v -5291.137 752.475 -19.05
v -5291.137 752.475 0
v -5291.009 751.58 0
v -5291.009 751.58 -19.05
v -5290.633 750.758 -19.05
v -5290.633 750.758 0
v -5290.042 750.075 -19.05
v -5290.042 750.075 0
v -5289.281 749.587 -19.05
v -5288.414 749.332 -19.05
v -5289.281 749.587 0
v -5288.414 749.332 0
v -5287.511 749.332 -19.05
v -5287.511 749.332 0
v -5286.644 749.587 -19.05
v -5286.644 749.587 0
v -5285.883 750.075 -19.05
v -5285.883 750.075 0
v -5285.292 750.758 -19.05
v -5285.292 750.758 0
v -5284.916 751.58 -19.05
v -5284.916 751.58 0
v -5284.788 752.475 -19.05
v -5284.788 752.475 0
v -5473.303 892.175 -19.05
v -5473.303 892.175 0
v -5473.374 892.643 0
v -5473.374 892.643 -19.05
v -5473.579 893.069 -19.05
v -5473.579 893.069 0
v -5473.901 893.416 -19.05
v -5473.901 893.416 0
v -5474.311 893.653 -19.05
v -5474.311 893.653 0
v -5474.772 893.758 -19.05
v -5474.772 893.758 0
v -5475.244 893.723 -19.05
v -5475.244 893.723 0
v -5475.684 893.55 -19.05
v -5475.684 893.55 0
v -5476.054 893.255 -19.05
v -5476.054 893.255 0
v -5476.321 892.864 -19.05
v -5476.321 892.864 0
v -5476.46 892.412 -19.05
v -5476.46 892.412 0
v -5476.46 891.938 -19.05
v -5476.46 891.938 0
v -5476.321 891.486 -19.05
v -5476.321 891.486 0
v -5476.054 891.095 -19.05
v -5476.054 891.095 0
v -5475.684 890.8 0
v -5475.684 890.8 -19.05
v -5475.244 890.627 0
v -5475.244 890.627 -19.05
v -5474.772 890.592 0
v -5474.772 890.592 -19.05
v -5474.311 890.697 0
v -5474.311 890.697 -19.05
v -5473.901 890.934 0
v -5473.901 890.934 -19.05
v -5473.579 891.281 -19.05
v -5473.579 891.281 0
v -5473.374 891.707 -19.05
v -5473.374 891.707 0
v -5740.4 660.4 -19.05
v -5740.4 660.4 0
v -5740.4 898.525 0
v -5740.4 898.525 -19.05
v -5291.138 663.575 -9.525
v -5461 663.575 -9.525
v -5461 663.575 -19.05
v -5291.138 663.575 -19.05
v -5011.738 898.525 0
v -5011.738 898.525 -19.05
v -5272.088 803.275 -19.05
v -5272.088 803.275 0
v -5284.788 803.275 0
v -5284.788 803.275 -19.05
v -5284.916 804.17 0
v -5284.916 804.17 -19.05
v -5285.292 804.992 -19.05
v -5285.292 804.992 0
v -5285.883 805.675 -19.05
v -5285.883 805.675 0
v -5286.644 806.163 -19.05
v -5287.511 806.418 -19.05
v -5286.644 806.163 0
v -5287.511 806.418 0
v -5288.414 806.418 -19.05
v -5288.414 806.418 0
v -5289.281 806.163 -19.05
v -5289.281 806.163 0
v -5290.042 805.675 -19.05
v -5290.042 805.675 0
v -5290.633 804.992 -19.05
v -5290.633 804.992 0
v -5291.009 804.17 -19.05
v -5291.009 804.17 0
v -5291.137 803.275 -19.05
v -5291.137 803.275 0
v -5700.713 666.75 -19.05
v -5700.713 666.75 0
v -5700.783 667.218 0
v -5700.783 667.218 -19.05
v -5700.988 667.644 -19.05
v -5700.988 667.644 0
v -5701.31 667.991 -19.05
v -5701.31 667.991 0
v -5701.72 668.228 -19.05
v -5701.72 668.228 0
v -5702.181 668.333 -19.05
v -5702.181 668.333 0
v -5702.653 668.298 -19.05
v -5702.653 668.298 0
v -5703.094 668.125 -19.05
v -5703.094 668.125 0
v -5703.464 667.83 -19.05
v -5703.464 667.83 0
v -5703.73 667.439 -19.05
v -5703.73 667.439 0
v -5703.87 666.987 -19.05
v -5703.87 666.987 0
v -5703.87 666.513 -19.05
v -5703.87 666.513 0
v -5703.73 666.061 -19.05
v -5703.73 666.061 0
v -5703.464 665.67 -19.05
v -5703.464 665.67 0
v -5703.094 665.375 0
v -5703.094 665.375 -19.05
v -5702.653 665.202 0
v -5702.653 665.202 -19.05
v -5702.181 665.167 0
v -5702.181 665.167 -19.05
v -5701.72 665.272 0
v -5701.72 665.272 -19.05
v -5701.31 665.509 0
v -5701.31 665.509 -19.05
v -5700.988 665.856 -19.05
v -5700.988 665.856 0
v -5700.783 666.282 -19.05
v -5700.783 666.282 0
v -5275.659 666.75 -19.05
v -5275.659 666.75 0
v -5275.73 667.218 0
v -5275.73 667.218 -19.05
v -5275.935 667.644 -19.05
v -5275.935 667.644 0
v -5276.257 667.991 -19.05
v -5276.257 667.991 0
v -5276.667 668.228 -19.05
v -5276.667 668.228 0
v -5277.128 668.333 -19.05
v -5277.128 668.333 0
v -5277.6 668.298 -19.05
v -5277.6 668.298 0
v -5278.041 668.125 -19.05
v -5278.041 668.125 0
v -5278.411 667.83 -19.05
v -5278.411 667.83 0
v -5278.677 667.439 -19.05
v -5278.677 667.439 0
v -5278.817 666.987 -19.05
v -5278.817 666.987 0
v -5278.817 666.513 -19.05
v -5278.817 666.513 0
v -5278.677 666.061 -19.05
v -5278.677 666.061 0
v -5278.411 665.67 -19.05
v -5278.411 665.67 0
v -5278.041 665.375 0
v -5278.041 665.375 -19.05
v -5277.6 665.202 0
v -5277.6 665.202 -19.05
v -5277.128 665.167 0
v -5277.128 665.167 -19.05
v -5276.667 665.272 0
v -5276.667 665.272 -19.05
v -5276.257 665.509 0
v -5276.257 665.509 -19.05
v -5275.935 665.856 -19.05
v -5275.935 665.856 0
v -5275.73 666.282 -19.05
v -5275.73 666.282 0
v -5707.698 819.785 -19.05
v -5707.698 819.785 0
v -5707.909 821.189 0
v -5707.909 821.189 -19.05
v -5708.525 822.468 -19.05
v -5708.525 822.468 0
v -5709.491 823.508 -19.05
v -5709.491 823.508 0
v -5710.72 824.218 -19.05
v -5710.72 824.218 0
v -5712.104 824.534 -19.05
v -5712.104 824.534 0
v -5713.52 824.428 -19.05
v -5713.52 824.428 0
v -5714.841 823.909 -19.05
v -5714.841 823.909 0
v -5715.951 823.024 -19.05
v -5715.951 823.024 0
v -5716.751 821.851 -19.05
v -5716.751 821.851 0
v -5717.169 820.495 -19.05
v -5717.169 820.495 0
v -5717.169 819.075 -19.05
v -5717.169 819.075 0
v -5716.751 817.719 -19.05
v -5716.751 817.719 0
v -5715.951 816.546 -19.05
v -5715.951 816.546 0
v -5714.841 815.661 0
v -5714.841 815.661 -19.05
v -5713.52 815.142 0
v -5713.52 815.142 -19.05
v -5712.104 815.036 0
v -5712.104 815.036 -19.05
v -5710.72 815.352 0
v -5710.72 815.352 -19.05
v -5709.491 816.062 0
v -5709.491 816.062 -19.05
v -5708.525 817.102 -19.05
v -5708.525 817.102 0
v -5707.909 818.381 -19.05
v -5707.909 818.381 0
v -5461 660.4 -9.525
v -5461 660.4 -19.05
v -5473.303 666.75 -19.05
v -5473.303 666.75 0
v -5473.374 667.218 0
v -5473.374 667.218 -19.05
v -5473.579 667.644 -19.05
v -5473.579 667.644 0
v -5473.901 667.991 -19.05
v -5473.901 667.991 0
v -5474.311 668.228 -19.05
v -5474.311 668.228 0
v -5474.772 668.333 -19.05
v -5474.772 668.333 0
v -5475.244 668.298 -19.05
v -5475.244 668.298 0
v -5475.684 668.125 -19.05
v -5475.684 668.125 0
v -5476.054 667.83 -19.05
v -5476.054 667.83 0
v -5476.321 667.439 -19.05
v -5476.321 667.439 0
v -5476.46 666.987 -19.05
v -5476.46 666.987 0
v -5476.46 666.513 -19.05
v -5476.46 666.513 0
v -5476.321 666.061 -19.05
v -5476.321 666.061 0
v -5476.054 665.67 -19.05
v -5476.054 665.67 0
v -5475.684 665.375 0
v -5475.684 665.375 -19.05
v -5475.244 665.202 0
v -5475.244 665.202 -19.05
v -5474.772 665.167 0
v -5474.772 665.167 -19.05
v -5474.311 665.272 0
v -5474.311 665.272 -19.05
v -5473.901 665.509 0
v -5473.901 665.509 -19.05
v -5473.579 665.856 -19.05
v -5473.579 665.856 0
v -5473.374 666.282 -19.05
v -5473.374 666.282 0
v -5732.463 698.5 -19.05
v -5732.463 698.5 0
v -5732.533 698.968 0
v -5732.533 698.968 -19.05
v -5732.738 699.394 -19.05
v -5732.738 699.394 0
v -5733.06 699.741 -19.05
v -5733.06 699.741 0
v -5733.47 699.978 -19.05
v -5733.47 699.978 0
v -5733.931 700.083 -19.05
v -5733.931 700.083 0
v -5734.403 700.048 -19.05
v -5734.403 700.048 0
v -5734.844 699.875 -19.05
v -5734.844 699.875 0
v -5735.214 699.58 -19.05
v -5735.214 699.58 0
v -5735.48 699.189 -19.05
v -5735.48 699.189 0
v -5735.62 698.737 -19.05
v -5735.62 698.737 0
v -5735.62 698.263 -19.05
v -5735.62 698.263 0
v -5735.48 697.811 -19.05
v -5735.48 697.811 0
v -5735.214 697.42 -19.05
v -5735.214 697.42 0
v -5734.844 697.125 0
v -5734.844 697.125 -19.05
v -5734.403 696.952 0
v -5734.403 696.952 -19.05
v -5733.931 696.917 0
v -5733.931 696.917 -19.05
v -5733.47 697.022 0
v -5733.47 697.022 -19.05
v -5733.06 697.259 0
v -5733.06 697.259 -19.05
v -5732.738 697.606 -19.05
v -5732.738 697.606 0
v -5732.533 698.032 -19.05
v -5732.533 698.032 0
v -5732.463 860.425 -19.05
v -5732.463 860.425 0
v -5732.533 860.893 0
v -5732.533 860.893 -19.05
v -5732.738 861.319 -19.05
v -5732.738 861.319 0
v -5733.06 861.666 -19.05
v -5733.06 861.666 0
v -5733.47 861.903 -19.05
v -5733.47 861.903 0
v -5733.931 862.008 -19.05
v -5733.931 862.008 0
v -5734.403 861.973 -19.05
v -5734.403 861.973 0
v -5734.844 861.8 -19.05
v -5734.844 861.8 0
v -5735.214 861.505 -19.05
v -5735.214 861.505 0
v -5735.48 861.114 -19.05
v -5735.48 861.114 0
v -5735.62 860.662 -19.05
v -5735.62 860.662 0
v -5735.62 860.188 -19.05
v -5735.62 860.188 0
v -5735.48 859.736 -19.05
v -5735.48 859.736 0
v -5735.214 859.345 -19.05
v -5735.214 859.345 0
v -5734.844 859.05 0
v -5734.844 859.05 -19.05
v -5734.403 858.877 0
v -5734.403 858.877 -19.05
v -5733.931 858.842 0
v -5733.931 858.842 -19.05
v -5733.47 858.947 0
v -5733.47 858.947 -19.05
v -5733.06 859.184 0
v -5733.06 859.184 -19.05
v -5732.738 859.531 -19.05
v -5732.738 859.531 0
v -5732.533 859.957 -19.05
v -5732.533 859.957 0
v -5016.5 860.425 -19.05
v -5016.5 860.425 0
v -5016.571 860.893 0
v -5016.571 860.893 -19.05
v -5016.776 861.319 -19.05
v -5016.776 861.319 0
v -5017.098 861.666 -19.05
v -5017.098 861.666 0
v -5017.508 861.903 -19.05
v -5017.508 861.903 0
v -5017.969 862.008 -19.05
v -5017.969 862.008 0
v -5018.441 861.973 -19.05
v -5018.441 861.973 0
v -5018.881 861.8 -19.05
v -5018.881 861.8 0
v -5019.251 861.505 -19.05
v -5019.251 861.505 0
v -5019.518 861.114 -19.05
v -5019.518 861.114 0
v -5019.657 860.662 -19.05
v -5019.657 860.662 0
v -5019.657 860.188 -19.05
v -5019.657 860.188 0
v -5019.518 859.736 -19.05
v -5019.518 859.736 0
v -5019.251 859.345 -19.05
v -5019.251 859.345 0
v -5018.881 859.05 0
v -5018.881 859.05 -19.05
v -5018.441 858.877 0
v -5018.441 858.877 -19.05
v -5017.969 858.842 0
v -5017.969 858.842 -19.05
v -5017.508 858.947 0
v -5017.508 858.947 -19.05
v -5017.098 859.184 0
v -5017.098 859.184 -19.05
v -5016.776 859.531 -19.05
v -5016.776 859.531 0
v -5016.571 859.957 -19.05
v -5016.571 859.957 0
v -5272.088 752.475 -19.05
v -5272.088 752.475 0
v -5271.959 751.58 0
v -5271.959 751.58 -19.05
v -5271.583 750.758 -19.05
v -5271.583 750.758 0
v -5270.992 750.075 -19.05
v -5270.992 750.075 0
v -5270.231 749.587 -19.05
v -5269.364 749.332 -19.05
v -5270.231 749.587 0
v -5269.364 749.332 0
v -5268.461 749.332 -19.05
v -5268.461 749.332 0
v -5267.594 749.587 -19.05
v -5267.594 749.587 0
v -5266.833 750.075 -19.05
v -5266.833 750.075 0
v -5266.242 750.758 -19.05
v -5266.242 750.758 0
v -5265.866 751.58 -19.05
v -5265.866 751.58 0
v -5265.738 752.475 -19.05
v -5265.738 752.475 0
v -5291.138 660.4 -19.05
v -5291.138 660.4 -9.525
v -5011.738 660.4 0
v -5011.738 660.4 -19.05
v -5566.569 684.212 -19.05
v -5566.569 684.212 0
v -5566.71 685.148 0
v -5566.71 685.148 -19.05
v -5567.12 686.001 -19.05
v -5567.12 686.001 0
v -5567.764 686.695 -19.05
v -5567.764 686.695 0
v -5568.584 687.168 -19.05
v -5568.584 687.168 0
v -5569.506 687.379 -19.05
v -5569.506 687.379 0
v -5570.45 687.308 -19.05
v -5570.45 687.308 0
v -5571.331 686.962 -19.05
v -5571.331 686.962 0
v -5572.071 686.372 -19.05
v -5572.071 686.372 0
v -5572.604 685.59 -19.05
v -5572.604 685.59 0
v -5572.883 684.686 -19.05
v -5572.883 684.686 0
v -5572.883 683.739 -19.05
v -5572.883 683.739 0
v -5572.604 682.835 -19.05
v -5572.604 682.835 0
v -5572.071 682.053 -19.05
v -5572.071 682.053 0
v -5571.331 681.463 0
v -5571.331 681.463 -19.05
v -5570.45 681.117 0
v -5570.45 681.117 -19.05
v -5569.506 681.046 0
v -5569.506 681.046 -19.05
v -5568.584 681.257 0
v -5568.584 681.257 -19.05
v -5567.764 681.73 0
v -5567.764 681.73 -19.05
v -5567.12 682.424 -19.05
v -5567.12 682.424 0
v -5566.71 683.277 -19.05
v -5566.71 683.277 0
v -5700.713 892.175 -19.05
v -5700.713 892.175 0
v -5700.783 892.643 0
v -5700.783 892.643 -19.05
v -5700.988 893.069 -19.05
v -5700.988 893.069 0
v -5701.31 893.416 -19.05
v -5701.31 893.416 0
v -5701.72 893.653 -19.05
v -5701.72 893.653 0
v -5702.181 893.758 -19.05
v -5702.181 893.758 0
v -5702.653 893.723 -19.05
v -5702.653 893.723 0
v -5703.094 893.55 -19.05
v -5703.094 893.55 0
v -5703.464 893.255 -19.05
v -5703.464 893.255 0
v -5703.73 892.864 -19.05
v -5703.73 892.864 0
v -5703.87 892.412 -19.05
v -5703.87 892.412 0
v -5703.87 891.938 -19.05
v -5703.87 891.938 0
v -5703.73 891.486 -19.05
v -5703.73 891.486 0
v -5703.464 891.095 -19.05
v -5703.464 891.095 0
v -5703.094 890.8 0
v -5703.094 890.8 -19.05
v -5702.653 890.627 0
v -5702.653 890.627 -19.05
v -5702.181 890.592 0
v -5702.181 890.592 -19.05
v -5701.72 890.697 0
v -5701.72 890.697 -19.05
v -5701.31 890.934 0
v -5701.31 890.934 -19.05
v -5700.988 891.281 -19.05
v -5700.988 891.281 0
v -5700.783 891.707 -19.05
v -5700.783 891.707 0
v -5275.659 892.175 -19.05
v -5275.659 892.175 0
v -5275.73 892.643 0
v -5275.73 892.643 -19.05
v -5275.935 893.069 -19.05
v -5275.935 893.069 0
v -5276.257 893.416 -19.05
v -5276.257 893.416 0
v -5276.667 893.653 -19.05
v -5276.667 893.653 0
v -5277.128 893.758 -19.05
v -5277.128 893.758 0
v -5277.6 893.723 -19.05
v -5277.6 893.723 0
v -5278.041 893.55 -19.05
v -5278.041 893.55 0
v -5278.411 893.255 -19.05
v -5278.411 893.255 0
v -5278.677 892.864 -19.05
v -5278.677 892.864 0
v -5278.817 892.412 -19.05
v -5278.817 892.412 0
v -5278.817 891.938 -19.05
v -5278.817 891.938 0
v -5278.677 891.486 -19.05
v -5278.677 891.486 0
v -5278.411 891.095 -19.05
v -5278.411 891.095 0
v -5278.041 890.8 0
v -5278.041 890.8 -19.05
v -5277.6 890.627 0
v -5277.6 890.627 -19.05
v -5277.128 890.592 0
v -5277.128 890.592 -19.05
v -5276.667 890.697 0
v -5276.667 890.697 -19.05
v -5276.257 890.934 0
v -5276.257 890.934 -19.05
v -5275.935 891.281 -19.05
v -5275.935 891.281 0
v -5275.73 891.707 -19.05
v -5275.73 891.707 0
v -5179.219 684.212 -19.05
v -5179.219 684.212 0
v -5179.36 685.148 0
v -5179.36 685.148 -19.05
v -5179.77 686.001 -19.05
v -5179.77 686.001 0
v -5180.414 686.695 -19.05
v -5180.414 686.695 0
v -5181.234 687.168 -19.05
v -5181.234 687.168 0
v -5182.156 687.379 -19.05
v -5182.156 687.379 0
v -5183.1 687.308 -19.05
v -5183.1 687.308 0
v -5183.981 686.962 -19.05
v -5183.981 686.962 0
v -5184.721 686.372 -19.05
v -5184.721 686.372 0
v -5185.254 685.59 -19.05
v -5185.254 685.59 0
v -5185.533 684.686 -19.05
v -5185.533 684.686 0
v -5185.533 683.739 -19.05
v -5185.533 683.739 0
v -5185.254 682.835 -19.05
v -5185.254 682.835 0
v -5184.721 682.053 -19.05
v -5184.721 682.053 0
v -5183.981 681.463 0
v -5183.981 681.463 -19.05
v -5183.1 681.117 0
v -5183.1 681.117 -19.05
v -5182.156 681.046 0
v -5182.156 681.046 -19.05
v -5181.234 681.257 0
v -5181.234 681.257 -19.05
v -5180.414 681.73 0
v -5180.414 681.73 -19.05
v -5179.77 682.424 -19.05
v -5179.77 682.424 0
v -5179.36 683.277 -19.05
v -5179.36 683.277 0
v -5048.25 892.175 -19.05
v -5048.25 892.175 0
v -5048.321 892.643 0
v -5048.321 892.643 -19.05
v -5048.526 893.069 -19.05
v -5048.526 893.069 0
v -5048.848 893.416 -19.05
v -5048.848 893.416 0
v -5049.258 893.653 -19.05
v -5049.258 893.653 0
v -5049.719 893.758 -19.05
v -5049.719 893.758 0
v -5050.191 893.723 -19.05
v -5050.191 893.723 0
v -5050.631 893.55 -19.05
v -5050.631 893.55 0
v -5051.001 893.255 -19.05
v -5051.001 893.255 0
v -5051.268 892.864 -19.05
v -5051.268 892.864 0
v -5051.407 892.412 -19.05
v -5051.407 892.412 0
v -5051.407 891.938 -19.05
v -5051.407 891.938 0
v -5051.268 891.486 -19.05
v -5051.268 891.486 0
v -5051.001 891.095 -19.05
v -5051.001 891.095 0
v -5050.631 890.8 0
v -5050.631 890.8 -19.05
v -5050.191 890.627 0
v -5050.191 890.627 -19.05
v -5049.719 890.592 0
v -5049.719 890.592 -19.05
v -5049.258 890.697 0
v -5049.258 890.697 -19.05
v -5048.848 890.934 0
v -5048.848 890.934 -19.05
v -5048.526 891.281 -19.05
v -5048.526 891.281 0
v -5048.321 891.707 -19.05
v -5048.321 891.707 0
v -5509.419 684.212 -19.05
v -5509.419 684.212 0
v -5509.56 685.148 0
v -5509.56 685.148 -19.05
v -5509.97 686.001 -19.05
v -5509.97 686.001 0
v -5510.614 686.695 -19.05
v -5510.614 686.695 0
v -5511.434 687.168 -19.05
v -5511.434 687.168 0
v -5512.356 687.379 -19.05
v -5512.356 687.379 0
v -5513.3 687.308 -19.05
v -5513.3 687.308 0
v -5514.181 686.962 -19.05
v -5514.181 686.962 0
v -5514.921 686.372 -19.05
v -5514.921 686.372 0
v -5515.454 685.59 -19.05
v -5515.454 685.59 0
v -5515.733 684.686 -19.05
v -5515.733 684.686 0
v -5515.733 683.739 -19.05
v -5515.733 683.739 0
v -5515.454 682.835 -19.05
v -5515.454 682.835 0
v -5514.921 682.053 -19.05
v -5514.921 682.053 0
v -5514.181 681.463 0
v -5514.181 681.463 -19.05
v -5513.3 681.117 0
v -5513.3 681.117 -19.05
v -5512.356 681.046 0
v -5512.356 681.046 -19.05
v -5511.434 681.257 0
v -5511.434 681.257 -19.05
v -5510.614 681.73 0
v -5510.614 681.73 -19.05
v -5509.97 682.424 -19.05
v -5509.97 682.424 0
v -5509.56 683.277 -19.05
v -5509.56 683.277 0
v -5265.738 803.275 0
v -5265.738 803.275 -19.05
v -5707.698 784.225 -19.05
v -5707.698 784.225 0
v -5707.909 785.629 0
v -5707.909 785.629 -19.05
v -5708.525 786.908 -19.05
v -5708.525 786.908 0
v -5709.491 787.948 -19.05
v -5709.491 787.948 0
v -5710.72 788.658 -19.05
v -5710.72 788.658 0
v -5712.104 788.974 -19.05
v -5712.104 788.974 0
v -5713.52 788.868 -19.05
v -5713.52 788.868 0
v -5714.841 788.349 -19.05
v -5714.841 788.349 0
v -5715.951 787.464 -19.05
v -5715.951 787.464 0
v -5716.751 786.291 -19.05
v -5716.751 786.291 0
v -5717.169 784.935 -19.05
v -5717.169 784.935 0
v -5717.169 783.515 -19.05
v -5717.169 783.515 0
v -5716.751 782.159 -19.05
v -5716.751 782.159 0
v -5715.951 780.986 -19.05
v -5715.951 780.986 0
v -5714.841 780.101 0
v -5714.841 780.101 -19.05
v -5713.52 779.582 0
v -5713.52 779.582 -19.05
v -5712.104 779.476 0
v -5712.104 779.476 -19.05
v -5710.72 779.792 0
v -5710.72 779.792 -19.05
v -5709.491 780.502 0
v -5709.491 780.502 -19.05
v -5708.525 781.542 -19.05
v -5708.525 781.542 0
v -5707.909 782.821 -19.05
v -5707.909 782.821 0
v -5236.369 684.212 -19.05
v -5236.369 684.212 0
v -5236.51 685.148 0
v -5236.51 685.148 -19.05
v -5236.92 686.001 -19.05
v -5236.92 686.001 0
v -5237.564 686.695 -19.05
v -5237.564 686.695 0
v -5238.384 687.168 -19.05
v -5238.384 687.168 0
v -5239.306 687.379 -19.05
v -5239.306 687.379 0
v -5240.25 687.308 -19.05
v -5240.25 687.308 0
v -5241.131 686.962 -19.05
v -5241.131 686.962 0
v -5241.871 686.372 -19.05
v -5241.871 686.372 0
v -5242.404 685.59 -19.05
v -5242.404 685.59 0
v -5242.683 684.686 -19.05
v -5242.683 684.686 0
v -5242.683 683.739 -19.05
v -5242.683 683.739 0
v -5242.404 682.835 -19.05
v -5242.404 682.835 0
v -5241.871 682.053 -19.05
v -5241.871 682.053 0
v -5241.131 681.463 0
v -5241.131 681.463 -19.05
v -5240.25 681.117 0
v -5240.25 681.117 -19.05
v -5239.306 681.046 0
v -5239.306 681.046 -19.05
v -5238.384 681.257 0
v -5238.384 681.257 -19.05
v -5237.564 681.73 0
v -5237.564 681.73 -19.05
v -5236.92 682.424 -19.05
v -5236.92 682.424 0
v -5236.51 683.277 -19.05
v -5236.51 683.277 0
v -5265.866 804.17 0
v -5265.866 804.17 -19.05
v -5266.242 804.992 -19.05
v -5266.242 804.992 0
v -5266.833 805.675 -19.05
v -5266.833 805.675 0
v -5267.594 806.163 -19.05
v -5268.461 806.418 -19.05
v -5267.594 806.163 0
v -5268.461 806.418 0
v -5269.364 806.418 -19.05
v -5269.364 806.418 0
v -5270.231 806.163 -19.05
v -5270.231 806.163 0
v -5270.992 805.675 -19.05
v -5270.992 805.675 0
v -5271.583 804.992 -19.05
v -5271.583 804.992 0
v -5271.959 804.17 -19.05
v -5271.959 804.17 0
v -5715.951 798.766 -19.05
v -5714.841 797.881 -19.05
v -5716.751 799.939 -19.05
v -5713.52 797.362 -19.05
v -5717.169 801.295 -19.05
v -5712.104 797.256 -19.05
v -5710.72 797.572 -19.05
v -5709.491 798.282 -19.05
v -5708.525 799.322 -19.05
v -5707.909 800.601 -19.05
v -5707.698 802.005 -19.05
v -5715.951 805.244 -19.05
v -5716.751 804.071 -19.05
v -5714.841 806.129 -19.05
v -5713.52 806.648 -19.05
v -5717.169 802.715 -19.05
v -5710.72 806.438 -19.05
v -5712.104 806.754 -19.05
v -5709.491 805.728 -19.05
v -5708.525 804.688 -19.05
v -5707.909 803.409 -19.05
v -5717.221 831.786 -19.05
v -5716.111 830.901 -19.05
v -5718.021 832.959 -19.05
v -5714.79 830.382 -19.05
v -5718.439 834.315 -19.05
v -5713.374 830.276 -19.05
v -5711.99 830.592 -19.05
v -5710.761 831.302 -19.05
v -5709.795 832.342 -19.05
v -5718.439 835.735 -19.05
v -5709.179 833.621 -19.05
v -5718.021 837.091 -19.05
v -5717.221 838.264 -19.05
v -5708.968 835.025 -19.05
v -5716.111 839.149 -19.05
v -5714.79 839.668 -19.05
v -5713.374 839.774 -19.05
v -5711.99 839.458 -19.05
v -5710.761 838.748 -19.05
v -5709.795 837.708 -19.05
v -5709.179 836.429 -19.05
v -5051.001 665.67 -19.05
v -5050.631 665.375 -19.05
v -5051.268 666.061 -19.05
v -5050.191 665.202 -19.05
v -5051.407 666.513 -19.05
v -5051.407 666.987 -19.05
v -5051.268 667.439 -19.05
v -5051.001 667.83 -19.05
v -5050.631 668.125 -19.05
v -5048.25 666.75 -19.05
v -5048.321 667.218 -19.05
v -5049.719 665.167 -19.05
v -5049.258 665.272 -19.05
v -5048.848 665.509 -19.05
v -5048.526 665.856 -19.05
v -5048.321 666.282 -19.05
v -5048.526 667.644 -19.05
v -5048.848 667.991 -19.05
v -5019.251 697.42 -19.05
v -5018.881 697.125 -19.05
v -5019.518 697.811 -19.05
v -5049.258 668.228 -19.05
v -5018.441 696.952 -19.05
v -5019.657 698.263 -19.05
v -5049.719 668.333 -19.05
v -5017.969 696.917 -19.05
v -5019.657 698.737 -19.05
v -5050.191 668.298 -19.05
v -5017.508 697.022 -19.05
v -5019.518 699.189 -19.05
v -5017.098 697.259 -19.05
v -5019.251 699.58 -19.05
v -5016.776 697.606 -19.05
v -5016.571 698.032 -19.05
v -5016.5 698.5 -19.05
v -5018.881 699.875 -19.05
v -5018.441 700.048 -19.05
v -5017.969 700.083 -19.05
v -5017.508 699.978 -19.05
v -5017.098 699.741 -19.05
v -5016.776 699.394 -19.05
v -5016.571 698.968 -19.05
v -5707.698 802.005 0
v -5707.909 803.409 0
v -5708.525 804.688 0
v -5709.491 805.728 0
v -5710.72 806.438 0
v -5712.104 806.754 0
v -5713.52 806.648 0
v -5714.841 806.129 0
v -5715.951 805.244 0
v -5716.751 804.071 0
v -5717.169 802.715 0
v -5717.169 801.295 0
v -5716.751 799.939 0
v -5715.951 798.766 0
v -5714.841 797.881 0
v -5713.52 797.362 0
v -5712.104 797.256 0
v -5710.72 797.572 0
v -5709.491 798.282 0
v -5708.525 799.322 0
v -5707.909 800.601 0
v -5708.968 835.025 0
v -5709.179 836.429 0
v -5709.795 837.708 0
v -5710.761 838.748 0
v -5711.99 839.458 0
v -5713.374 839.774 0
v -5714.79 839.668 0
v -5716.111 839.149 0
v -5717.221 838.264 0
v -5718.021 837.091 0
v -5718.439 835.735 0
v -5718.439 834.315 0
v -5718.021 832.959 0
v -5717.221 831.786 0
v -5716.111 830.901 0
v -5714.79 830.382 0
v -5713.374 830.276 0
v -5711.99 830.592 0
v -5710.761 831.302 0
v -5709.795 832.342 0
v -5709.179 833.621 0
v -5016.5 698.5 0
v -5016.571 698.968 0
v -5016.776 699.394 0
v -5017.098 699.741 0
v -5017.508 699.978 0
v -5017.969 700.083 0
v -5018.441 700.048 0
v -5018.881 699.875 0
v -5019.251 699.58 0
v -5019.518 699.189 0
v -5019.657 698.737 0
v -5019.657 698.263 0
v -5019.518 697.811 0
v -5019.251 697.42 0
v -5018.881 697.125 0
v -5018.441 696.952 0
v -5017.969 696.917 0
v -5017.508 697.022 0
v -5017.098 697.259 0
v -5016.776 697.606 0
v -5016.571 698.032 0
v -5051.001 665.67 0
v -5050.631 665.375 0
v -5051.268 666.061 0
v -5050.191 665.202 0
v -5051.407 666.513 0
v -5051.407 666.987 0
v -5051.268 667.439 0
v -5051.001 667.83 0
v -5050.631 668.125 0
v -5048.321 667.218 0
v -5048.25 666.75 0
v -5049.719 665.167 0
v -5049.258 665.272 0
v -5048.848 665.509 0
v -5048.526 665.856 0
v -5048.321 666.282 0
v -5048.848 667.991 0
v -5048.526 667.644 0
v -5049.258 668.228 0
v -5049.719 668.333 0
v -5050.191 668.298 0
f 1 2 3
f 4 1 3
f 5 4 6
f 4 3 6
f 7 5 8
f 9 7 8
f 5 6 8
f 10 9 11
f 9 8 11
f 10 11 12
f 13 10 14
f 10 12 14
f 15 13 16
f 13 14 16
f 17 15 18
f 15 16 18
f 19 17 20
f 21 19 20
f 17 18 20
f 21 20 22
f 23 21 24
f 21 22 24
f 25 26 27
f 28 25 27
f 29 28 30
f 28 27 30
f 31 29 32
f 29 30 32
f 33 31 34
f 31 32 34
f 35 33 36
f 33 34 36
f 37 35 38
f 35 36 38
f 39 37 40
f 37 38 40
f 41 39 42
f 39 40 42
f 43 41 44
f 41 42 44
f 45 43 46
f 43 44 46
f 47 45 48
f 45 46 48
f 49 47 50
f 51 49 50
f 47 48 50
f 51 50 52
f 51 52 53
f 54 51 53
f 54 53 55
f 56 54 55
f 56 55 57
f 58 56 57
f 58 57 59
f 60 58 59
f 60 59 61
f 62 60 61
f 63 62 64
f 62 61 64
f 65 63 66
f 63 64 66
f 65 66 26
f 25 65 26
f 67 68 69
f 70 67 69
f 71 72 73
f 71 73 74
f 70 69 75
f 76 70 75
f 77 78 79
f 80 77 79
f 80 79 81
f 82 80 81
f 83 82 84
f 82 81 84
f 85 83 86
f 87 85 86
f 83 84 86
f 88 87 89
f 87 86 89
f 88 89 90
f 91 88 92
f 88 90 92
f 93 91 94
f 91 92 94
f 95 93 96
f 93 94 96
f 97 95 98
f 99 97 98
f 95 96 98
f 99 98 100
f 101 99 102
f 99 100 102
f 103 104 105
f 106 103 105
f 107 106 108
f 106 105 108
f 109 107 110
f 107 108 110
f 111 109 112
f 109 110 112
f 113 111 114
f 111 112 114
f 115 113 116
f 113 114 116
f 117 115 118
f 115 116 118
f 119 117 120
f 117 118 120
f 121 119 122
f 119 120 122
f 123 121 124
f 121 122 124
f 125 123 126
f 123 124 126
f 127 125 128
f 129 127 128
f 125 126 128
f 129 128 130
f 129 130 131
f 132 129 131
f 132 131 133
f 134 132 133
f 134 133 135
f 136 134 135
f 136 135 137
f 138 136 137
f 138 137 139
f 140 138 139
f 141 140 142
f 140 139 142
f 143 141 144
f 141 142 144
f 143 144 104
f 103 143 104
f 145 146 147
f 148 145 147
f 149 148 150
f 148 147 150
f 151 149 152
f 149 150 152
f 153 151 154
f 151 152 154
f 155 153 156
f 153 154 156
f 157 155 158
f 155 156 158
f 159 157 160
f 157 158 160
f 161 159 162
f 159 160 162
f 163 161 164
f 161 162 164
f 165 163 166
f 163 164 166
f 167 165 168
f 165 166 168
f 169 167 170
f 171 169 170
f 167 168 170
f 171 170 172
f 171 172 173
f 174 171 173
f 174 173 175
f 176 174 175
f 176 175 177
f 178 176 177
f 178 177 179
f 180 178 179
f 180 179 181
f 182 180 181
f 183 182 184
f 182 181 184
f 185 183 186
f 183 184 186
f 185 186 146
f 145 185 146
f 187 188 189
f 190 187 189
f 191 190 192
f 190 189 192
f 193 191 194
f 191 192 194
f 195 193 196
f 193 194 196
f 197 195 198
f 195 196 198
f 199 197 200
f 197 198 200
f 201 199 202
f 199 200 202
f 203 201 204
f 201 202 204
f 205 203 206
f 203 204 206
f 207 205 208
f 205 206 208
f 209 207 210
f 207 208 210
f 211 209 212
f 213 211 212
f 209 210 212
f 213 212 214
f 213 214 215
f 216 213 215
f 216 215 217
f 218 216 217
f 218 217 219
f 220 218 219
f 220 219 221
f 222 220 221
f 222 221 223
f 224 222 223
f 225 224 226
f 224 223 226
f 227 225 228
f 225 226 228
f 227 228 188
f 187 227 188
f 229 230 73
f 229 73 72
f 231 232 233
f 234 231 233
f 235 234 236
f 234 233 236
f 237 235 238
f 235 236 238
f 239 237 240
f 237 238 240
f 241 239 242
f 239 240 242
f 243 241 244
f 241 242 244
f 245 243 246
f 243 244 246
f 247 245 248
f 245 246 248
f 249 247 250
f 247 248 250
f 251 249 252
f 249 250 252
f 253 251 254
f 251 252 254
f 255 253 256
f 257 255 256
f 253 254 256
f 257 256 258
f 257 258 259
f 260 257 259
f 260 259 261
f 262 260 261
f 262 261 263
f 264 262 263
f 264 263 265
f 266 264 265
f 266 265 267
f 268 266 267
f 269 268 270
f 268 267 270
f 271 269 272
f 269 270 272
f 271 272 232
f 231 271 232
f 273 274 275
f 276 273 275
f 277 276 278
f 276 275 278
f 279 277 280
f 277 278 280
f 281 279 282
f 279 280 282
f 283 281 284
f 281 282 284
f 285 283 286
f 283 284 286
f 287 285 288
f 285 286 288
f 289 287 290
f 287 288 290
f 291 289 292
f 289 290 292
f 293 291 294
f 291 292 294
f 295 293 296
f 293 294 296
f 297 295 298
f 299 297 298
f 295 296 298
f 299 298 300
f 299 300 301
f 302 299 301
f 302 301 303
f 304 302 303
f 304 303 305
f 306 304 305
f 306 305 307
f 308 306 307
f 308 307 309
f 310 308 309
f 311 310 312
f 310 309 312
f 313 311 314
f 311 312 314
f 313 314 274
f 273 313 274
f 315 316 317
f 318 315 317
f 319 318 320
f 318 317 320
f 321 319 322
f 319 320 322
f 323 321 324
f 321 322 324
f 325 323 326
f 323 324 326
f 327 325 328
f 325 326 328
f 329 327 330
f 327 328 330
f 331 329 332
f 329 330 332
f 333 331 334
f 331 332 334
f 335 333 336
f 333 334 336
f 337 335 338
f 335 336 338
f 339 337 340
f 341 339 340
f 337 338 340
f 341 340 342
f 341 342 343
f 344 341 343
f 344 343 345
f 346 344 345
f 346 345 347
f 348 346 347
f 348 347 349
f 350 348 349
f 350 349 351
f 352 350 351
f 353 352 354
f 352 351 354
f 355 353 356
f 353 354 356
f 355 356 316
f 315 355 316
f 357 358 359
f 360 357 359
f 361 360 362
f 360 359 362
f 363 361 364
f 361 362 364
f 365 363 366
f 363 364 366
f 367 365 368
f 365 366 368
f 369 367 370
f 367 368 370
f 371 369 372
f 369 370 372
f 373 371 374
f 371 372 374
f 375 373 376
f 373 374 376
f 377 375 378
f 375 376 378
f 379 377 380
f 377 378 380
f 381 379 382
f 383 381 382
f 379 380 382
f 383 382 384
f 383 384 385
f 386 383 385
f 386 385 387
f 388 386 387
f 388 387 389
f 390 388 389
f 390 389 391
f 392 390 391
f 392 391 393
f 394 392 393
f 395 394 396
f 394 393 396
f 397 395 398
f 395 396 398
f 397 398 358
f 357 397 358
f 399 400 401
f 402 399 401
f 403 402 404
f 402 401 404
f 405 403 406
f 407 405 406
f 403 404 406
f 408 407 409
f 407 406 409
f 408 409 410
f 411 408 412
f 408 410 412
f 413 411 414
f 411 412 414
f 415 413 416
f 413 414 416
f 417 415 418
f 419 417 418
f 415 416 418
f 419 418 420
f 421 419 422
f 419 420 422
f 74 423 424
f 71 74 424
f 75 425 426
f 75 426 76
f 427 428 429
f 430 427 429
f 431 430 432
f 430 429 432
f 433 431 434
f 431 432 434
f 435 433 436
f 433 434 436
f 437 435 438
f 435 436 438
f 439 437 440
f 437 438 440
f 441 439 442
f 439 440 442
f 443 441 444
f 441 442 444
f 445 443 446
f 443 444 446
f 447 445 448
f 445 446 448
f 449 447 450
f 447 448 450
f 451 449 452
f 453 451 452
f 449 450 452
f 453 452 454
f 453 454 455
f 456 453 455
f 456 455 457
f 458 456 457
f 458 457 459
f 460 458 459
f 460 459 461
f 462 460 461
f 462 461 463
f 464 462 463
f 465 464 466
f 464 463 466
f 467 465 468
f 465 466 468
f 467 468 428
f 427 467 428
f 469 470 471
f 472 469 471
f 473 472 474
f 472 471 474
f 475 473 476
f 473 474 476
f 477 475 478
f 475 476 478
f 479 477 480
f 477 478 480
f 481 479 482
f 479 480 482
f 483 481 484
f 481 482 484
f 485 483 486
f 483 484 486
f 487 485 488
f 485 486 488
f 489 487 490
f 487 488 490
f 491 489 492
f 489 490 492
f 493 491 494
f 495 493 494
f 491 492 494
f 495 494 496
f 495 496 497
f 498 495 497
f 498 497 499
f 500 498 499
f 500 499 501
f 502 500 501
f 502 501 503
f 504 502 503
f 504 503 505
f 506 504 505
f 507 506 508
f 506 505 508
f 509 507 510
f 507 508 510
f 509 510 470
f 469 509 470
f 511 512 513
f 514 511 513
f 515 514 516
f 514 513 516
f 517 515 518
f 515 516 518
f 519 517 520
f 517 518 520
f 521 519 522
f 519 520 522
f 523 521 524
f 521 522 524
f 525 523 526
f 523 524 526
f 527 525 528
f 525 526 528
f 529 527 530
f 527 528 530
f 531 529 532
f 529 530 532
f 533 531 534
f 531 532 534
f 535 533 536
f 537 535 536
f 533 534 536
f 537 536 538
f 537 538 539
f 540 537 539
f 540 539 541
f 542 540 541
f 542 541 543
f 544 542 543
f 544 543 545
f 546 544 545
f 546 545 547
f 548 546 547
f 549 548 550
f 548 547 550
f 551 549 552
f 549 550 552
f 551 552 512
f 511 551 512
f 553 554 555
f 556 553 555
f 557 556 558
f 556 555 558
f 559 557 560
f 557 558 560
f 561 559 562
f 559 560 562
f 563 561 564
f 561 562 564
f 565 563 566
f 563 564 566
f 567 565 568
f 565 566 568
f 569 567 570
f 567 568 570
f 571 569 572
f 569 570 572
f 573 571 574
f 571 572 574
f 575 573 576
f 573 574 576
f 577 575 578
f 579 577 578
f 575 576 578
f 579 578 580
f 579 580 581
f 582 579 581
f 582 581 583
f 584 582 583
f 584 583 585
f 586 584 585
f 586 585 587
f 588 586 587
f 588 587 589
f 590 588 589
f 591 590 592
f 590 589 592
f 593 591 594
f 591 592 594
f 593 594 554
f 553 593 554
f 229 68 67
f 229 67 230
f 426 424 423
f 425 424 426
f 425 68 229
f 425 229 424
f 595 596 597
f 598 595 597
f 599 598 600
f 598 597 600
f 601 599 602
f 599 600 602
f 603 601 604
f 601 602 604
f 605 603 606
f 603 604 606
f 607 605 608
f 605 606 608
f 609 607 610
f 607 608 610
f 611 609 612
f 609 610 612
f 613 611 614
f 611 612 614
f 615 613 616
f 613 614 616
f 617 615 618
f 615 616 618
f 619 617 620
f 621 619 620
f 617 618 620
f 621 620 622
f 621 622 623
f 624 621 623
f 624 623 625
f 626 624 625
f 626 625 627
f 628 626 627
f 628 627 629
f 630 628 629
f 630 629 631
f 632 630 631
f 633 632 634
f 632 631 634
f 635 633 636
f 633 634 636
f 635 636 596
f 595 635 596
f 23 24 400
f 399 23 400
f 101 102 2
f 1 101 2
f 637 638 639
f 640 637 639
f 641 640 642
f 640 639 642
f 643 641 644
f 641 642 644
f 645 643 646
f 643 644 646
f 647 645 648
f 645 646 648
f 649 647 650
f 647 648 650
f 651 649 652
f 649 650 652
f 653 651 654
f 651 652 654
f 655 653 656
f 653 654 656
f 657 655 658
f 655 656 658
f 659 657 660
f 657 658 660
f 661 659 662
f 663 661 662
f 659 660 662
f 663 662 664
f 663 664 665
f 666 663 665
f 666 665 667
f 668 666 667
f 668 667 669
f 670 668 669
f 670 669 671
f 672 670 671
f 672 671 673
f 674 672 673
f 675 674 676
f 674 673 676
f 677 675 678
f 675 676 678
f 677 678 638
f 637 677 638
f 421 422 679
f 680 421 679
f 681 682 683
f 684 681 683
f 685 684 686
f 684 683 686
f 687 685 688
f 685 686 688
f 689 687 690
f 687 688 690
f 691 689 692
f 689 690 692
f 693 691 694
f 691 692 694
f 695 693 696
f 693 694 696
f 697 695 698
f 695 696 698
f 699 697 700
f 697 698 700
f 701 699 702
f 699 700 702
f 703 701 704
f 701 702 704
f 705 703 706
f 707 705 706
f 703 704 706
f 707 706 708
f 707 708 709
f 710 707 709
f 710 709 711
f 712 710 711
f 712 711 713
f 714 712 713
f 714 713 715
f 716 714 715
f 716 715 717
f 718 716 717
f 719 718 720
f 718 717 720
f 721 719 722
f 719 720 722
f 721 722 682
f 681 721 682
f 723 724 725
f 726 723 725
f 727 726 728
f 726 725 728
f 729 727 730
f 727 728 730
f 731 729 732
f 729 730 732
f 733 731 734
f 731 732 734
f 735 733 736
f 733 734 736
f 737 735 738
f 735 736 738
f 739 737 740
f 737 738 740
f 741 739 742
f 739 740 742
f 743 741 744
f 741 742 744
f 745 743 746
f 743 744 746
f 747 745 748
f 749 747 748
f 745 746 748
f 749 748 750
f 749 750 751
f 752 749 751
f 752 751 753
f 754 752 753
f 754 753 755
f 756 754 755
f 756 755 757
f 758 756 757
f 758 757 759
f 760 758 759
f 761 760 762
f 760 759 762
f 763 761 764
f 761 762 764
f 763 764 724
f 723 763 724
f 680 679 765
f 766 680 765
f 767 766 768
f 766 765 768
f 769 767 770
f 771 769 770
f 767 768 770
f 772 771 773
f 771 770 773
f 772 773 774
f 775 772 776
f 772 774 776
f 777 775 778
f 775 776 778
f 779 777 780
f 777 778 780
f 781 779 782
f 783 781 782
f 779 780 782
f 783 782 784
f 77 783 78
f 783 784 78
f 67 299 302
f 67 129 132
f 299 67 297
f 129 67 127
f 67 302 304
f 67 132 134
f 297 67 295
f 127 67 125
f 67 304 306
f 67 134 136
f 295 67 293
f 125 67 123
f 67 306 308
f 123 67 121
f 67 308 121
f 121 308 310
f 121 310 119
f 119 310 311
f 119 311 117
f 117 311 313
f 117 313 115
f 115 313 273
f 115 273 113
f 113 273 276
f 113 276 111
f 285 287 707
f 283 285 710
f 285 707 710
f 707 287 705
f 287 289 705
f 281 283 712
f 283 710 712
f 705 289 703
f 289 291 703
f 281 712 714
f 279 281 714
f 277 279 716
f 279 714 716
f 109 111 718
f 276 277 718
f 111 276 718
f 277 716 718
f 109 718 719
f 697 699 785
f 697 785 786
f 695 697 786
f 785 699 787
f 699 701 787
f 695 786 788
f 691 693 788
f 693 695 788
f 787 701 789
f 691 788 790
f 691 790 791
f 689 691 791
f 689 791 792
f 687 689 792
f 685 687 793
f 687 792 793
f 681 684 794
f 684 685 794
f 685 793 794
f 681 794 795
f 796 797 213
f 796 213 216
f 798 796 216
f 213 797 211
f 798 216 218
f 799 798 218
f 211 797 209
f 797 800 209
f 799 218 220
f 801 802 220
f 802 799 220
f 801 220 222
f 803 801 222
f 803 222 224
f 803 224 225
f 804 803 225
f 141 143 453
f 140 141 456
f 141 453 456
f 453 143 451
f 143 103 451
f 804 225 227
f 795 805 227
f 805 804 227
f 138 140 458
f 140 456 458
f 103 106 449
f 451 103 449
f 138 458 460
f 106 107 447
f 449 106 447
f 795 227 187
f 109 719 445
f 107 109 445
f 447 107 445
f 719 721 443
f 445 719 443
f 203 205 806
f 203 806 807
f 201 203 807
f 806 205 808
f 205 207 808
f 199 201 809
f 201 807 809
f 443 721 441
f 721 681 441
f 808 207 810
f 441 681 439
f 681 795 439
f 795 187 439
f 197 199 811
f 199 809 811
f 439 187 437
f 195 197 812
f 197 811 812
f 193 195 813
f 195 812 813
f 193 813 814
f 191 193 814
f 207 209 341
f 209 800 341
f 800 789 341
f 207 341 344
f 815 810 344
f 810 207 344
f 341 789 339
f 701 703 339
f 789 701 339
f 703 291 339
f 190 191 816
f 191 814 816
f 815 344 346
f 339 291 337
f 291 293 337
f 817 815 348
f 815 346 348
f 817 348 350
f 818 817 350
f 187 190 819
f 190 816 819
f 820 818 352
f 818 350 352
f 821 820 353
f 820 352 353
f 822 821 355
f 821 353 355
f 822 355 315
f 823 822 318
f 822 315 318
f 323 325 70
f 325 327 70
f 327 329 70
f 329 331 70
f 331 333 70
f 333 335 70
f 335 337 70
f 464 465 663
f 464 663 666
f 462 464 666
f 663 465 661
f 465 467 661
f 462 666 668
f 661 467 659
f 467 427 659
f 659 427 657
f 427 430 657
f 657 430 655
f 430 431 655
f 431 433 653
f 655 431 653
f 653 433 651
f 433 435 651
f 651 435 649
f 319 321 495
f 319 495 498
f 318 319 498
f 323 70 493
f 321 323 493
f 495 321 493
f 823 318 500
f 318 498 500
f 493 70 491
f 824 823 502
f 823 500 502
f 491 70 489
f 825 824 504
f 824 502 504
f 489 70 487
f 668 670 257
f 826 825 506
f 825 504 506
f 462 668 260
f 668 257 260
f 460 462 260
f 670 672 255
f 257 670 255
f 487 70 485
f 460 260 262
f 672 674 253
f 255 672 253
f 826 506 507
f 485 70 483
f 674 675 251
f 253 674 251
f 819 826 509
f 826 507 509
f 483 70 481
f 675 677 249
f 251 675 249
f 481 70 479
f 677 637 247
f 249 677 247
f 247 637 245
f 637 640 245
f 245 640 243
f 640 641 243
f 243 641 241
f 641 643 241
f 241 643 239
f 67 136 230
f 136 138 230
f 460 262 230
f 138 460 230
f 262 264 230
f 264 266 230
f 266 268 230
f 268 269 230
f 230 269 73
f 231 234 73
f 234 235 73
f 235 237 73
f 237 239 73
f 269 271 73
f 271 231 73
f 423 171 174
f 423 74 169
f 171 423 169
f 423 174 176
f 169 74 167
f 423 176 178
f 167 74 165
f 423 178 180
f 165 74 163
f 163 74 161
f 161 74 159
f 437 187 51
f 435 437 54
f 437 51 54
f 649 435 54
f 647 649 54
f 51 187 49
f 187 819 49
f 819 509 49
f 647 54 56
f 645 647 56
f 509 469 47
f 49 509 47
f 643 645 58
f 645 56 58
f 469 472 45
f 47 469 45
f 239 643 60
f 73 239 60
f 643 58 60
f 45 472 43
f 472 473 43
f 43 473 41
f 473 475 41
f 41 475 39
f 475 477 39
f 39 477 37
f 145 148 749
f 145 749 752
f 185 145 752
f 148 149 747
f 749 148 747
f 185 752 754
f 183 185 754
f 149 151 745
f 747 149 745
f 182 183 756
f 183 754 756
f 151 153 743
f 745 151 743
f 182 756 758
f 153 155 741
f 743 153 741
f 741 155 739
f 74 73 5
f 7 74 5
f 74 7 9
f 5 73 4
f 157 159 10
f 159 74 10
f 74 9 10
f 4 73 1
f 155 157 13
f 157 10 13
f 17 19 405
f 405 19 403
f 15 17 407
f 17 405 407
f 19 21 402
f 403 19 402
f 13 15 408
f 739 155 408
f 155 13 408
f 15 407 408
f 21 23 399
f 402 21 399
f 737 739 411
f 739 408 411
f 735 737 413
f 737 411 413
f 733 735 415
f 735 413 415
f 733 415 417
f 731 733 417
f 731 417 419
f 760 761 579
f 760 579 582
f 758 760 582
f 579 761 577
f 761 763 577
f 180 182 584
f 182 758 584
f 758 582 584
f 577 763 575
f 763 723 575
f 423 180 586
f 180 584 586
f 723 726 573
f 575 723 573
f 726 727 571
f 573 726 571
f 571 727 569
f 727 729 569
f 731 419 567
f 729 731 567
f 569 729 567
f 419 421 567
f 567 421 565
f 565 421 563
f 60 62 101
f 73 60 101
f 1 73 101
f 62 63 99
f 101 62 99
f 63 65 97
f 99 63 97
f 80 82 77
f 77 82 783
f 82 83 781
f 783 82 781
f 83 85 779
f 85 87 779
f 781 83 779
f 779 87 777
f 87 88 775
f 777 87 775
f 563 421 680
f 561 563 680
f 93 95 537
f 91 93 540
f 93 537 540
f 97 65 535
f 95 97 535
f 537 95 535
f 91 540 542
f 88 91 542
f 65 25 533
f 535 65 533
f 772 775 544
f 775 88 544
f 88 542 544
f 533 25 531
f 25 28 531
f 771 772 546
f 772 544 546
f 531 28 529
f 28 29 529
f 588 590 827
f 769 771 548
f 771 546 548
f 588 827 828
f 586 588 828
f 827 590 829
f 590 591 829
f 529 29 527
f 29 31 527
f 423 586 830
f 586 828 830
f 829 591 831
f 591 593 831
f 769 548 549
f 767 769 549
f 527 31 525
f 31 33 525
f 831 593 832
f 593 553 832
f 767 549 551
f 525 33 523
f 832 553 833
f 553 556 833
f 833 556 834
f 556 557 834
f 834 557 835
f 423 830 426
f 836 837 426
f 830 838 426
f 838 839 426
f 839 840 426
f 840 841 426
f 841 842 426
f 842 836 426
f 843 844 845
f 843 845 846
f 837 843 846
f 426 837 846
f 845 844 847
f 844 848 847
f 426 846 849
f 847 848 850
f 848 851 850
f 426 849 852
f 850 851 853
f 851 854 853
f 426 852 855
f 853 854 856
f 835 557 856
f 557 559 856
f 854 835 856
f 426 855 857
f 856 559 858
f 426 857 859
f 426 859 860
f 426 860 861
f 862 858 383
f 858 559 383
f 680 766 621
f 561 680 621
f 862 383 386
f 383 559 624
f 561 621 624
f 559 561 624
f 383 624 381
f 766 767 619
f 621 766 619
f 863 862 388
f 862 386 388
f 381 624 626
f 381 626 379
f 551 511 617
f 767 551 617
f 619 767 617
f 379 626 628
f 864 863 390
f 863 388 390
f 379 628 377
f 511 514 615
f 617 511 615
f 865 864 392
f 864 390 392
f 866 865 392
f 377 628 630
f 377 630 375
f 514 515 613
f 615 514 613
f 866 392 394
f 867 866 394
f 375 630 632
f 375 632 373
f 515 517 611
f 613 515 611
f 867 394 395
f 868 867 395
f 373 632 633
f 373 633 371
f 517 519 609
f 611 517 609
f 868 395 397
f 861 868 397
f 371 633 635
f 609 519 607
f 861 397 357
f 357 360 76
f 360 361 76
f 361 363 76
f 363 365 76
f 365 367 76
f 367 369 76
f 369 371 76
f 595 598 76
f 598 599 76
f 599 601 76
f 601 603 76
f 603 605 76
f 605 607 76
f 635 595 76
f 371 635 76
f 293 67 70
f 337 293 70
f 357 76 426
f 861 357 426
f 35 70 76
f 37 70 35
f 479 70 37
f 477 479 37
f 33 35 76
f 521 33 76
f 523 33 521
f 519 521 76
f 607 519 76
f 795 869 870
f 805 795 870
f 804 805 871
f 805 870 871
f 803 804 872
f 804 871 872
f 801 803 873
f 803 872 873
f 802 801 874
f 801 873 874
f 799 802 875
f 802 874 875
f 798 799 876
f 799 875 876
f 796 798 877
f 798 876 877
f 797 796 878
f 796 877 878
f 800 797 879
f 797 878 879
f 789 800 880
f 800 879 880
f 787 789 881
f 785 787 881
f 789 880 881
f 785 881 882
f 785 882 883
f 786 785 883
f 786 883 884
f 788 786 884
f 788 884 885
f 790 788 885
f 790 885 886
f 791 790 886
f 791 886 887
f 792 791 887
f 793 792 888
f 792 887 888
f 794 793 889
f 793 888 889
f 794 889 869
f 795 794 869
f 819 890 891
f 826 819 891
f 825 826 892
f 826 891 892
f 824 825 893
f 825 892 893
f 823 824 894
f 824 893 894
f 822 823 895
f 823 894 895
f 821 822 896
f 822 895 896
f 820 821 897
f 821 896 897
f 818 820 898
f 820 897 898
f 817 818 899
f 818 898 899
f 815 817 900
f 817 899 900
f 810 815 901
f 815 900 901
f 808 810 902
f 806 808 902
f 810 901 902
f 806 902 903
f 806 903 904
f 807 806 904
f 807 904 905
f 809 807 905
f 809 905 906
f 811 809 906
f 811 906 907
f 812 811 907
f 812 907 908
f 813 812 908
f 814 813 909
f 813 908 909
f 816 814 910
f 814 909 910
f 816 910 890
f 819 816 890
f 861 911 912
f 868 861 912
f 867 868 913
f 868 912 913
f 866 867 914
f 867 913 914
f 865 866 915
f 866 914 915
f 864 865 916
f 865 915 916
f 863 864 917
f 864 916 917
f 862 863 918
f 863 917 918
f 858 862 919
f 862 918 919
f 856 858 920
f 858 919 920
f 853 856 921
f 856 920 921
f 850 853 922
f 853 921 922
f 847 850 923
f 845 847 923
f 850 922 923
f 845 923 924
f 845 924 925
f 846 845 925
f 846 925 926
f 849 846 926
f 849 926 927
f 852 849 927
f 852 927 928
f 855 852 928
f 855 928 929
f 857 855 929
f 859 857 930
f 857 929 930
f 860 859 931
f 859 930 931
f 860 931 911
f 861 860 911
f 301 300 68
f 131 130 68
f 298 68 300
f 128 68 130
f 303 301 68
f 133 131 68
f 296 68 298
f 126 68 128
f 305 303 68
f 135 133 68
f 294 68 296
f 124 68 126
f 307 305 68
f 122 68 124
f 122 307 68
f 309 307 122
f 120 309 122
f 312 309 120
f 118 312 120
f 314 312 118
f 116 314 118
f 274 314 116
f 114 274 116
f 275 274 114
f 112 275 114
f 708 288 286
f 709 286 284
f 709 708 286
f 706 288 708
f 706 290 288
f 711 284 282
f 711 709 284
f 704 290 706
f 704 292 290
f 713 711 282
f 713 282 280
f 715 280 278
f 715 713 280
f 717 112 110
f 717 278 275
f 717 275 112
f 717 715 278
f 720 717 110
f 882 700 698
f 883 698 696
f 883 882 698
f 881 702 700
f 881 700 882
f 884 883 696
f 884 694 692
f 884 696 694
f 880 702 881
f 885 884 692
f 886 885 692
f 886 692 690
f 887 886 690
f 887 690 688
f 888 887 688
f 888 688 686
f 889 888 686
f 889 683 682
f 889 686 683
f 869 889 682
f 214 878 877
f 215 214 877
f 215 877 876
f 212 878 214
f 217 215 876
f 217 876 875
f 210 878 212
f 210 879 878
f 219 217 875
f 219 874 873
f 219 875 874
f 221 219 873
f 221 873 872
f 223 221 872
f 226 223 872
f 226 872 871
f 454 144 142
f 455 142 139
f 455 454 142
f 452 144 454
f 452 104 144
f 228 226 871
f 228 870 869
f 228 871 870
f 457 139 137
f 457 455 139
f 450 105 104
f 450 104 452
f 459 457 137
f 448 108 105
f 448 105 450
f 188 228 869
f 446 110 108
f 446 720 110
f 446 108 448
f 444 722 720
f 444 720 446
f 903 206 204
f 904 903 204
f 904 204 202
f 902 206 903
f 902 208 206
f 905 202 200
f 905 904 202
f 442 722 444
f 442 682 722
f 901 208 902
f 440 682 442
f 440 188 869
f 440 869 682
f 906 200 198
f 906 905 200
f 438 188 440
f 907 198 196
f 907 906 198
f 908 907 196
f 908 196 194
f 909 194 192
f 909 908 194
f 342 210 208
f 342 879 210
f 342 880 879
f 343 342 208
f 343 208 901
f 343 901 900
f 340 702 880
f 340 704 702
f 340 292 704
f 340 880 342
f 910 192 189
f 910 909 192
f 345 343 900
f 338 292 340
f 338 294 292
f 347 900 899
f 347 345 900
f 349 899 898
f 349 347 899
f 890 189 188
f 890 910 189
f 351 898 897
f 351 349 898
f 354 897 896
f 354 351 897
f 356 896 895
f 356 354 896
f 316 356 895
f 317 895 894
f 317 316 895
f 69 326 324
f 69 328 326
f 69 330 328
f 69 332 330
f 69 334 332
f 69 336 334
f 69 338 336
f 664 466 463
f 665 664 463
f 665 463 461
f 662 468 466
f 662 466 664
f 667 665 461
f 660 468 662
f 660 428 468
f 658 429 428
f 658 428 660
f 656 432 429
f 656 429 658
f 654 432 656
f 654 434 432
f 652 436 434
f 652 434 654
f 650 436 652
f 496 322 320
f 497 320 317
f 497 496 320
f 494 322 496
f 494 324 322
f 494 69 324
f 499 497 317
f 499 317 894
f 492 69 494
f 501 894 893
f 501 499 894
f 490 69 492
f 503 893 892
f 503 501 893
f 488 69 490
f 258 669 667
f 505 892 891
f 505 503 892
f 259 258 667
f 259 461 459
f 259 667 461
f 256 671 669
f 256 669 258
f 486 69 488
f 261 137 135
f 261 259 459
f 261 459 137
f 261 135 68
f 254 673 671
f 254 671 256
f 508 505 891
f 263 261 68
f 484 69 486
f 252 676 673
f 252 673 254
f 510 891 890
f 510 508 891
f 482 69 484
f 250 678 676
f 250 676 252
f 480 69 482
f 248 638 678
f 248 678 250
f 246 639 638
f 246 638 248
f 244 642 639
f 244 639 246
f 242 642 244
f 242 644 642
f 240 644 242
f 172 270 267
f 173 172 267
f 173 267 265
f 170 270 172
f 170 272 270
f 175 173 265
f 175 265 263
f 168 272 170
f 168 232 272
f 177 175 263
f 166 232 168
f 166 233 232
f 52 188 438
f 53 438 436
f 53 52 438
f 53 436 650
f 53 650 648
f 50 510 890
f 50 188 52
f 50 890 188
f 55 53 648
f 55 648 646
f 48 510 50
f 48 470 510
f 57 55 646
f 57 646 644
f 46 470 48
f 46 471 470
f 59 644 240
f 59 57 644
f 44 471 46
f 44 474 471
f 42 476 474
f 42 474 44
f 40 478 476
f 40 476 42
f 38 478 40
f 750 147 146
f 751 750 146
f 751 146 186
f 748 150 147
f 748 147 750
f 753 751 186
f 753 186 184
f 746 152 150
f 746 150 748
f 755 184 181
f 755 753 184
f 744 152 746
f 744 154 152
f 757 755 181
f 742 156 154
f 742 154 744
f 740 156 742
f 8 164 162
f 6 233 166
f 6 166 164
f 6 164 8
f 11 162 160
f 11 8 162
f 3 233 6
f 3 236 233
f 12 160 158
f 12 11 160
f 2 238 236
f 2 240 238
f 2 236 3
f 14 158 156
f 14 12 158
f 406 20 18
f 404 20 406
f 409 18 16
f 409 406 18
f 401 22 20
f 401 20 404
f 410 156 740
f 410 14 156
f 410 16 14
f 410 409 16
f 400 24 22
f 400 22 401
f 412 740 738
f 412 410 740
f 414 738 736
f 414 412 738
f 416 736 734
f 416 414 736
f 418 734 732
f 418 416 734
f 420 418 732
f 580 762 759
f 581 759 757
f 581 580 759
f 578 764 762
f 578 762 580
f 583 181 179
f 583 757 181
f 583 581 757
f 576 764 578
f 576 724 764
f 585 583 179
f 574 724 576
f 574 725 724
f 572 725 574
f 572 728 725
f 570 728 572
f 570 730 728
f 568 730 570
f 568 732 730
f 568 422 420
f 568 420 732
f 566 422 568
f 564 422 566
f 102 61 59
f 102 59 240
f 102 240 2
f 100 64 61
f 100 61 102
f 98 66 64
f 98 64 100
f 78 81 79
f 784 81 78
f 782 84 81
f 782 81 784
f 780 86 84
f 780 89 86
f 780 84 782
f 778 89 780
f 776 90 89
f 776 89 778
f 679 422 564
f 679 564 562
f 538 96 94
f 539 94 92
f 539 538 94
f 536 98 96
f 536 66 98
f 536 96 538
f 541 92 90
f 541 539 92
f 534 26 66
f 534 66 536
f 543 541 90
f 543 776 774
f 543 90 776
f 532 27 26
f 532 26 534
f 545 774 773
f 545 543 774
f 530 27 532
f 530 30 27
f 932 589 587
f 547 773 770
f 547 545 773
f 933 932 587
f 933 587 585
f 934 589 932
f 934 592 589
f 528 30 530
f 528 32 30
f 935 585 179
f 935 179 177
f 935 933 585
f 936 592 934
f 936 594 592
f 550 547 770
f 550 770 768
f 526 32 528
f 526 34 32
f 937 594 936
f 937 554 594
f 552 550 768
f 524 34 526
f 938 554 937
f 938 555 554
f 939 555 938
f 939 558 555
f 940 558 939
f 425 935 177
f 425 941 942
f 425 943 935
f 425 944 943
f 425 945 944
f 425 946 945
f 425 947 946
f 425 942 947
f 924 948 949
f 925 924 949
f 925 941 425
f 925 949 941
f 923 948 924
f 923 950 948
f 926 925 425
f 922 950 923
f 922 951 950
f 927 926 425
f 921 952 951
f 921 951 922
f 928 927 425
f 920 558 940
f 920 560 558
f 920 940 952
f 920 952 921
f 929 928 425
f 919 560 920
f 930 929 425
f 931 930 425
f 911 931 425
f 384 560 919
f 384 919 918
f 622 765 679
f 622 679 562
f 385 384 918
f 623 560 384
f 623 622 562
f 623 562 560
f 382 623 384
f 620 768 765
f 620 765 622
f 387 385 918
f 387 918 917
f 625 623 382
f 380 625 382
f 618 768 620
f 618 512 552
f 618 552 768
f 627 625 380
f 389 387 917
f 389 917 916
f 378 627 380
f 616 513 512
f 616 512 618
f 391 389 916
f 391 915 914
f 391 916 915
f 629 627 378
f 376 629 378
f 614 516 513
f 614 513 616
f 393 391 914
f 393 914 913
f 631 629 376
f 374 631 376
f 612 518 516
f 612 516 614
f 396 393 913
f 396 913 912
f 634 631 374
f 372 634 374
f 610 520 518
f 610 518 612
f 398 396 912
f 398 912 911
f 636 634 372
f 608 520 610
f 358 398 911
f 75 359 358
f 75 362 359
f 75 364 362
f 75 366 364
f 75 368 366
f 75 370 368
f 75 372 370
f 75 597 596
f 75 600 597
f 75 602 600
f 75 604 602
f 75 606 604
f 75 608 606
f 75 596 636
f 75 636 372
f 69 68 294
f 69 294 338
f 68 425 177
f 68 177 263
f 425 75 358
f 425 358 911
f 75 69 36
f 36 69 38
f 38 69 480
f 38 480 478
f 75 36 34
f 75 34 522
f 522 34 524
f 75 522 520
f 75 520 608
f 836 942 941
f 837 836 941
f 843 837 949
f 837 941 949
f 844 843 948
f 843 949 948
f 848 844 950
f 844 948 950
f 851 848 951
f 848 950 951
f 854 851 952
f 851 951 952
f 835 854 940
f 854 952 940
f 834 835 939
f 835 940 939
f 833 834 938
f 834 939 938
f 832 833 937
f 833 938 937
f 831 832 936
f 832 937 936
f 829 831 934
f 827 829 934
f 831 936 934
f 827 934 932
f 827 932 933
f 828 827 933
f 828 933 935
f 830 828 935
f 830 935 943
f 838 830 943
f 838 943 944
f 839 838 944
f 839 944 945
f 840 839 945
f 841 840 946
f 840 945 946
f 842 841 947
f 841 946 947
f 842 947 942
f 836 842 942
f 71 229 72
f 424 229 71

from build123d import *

# Parameters (mm, degrees)
SKETCH2_W          = 728.6625
SKETCH2_H          = 238.125
EXTRUDE1_DEPTH     = 19.05
SKETCH3_R          = 1.5875
SKETCH3_R_2        = 4.7625
SKETCH3_R_3        = 3.175
CUT_EXTRUDE1_DEPTH = 19.05
SKETCH4_W          = 169.8625
SKETCH4_H          = 9.525
CUT_EXTRUDE2_DEPTH = 3.175


with BuildPart() as part:
    # Sketch2 → Extrude1 (new body)
    with BuildSketch(Plane.XY):
        with Locations((-5376.06875, 779.4625)):
            Rectangle(SKETCH2_W, SKETCH2_H)
    extrude(amount=-EXTRUDE1_DEPTH)

    # Sketch3 → Cut-Extrude1 (cut)
    with BuildSketch(Plane.XY):
        with Locations((-5702.3, 892.175)):
            Circle(SKETCH3_R)
        with Locations((-5734.05, 860.425)):
            Circle(SKETCH3_R)
        with Locations((-5713.73, 835.025)):
            Circle(SKETCH3_R_2)
        with Locations((-5712.46, 819.785)):
            Circle(SKETCH3_R_2)
        with Locations((-5712.46, 802.005)):
            Circle(SKETCH3_R_2)
        with Locations((-5712.46, 784.225)):
            Circle(SKETCH3_R_2)
        with Locations((-5734.05, 698.5)):
            Circle(SKETCH3_R)
        with Locations((-5702.3, 666.75)):
            Circle(SKETCH3_R)
        with Locations((-5569.74375, 684.2125)):
            Circle(SKETCH3_R_3)
        with Locations((-5512.59375, 684.2125)):
            Circle(SKETCH3_R_3)
        with Locations((-5474.890625, 666.75)):
            Circle(SKETCH3_R)
        with Locations((-5277.246875, 666.75)):
            Circle(SKETCH3_R)
        with Locations((-5239.54375, 684.2125)):
            Circle(SKETCH3_R_3)
        with Locations((-5182.39375, 684.2125)):
            Circle(SKETCH3_R_3)
        with Locations((-5049.8375, 666.75)):
            Circle(SKETCH3_R)
        with Locations((-5018.0875, 698.5)):
            Circle(SKETCH3_R)
        with Locations((-5018.0875, 860.425)):
            Circle(SKETCH3_R)
        with Locations((-5049.8375, 892.175)):
            Circle(SKETCH3_R)
        with Locations((-5277.246875, 892.175)):
            Circle(SKETCH3_R)
        with Locations((-5474.890625, 892.175)):
            Circle(SKETCH3_R)
        with BuildLine():
            Line((-5291.1375, 803.275), (-5291.1375, 752.475))
            ThreePointArc((-5291.1375, 752.475), (-5287.9625, 749.3), (-5284.7875, 752.475))
            Line((-5284.7875, 752.475), (-5272.0875, 752.475))
            ThreePointArc((-5272.0875, 752.475), (-5268.9125, 749.3), (-5265.7375, 752.475))
            Line((-5265.7375, 752.475), (-5265.7375, 803.275))
            ThreePointArc((-5265.7375, 803.275), (-5268.9125, 806.45), (-5272.0875, 803.275))
            Line((-5272.0875, 803.275), (-5284.7875, 803.275))
            ThreePointArc((-5284.7875, 803.275), (-5287.9625, 806.45), (-5291.1375, 803.275))
        make_face()
    extrude(amount=-CUT_EXTRUDE1_DEPTH, mode=Mode.SUBTRACT)

    # Sketch4 → Cut-Extrude2 (cut)
    with BuildSketch(Plane.XZ.offset(-660.4)):
        with Locations((-5376.06875, -14.2875)):
            Rectangle(SKETCH4_W, SKETCH4_H)
    extrude(amount=-CUT_EXTRUDE2_DEPTH, mode=Mode.SUBTRACT)


solid = part.part
